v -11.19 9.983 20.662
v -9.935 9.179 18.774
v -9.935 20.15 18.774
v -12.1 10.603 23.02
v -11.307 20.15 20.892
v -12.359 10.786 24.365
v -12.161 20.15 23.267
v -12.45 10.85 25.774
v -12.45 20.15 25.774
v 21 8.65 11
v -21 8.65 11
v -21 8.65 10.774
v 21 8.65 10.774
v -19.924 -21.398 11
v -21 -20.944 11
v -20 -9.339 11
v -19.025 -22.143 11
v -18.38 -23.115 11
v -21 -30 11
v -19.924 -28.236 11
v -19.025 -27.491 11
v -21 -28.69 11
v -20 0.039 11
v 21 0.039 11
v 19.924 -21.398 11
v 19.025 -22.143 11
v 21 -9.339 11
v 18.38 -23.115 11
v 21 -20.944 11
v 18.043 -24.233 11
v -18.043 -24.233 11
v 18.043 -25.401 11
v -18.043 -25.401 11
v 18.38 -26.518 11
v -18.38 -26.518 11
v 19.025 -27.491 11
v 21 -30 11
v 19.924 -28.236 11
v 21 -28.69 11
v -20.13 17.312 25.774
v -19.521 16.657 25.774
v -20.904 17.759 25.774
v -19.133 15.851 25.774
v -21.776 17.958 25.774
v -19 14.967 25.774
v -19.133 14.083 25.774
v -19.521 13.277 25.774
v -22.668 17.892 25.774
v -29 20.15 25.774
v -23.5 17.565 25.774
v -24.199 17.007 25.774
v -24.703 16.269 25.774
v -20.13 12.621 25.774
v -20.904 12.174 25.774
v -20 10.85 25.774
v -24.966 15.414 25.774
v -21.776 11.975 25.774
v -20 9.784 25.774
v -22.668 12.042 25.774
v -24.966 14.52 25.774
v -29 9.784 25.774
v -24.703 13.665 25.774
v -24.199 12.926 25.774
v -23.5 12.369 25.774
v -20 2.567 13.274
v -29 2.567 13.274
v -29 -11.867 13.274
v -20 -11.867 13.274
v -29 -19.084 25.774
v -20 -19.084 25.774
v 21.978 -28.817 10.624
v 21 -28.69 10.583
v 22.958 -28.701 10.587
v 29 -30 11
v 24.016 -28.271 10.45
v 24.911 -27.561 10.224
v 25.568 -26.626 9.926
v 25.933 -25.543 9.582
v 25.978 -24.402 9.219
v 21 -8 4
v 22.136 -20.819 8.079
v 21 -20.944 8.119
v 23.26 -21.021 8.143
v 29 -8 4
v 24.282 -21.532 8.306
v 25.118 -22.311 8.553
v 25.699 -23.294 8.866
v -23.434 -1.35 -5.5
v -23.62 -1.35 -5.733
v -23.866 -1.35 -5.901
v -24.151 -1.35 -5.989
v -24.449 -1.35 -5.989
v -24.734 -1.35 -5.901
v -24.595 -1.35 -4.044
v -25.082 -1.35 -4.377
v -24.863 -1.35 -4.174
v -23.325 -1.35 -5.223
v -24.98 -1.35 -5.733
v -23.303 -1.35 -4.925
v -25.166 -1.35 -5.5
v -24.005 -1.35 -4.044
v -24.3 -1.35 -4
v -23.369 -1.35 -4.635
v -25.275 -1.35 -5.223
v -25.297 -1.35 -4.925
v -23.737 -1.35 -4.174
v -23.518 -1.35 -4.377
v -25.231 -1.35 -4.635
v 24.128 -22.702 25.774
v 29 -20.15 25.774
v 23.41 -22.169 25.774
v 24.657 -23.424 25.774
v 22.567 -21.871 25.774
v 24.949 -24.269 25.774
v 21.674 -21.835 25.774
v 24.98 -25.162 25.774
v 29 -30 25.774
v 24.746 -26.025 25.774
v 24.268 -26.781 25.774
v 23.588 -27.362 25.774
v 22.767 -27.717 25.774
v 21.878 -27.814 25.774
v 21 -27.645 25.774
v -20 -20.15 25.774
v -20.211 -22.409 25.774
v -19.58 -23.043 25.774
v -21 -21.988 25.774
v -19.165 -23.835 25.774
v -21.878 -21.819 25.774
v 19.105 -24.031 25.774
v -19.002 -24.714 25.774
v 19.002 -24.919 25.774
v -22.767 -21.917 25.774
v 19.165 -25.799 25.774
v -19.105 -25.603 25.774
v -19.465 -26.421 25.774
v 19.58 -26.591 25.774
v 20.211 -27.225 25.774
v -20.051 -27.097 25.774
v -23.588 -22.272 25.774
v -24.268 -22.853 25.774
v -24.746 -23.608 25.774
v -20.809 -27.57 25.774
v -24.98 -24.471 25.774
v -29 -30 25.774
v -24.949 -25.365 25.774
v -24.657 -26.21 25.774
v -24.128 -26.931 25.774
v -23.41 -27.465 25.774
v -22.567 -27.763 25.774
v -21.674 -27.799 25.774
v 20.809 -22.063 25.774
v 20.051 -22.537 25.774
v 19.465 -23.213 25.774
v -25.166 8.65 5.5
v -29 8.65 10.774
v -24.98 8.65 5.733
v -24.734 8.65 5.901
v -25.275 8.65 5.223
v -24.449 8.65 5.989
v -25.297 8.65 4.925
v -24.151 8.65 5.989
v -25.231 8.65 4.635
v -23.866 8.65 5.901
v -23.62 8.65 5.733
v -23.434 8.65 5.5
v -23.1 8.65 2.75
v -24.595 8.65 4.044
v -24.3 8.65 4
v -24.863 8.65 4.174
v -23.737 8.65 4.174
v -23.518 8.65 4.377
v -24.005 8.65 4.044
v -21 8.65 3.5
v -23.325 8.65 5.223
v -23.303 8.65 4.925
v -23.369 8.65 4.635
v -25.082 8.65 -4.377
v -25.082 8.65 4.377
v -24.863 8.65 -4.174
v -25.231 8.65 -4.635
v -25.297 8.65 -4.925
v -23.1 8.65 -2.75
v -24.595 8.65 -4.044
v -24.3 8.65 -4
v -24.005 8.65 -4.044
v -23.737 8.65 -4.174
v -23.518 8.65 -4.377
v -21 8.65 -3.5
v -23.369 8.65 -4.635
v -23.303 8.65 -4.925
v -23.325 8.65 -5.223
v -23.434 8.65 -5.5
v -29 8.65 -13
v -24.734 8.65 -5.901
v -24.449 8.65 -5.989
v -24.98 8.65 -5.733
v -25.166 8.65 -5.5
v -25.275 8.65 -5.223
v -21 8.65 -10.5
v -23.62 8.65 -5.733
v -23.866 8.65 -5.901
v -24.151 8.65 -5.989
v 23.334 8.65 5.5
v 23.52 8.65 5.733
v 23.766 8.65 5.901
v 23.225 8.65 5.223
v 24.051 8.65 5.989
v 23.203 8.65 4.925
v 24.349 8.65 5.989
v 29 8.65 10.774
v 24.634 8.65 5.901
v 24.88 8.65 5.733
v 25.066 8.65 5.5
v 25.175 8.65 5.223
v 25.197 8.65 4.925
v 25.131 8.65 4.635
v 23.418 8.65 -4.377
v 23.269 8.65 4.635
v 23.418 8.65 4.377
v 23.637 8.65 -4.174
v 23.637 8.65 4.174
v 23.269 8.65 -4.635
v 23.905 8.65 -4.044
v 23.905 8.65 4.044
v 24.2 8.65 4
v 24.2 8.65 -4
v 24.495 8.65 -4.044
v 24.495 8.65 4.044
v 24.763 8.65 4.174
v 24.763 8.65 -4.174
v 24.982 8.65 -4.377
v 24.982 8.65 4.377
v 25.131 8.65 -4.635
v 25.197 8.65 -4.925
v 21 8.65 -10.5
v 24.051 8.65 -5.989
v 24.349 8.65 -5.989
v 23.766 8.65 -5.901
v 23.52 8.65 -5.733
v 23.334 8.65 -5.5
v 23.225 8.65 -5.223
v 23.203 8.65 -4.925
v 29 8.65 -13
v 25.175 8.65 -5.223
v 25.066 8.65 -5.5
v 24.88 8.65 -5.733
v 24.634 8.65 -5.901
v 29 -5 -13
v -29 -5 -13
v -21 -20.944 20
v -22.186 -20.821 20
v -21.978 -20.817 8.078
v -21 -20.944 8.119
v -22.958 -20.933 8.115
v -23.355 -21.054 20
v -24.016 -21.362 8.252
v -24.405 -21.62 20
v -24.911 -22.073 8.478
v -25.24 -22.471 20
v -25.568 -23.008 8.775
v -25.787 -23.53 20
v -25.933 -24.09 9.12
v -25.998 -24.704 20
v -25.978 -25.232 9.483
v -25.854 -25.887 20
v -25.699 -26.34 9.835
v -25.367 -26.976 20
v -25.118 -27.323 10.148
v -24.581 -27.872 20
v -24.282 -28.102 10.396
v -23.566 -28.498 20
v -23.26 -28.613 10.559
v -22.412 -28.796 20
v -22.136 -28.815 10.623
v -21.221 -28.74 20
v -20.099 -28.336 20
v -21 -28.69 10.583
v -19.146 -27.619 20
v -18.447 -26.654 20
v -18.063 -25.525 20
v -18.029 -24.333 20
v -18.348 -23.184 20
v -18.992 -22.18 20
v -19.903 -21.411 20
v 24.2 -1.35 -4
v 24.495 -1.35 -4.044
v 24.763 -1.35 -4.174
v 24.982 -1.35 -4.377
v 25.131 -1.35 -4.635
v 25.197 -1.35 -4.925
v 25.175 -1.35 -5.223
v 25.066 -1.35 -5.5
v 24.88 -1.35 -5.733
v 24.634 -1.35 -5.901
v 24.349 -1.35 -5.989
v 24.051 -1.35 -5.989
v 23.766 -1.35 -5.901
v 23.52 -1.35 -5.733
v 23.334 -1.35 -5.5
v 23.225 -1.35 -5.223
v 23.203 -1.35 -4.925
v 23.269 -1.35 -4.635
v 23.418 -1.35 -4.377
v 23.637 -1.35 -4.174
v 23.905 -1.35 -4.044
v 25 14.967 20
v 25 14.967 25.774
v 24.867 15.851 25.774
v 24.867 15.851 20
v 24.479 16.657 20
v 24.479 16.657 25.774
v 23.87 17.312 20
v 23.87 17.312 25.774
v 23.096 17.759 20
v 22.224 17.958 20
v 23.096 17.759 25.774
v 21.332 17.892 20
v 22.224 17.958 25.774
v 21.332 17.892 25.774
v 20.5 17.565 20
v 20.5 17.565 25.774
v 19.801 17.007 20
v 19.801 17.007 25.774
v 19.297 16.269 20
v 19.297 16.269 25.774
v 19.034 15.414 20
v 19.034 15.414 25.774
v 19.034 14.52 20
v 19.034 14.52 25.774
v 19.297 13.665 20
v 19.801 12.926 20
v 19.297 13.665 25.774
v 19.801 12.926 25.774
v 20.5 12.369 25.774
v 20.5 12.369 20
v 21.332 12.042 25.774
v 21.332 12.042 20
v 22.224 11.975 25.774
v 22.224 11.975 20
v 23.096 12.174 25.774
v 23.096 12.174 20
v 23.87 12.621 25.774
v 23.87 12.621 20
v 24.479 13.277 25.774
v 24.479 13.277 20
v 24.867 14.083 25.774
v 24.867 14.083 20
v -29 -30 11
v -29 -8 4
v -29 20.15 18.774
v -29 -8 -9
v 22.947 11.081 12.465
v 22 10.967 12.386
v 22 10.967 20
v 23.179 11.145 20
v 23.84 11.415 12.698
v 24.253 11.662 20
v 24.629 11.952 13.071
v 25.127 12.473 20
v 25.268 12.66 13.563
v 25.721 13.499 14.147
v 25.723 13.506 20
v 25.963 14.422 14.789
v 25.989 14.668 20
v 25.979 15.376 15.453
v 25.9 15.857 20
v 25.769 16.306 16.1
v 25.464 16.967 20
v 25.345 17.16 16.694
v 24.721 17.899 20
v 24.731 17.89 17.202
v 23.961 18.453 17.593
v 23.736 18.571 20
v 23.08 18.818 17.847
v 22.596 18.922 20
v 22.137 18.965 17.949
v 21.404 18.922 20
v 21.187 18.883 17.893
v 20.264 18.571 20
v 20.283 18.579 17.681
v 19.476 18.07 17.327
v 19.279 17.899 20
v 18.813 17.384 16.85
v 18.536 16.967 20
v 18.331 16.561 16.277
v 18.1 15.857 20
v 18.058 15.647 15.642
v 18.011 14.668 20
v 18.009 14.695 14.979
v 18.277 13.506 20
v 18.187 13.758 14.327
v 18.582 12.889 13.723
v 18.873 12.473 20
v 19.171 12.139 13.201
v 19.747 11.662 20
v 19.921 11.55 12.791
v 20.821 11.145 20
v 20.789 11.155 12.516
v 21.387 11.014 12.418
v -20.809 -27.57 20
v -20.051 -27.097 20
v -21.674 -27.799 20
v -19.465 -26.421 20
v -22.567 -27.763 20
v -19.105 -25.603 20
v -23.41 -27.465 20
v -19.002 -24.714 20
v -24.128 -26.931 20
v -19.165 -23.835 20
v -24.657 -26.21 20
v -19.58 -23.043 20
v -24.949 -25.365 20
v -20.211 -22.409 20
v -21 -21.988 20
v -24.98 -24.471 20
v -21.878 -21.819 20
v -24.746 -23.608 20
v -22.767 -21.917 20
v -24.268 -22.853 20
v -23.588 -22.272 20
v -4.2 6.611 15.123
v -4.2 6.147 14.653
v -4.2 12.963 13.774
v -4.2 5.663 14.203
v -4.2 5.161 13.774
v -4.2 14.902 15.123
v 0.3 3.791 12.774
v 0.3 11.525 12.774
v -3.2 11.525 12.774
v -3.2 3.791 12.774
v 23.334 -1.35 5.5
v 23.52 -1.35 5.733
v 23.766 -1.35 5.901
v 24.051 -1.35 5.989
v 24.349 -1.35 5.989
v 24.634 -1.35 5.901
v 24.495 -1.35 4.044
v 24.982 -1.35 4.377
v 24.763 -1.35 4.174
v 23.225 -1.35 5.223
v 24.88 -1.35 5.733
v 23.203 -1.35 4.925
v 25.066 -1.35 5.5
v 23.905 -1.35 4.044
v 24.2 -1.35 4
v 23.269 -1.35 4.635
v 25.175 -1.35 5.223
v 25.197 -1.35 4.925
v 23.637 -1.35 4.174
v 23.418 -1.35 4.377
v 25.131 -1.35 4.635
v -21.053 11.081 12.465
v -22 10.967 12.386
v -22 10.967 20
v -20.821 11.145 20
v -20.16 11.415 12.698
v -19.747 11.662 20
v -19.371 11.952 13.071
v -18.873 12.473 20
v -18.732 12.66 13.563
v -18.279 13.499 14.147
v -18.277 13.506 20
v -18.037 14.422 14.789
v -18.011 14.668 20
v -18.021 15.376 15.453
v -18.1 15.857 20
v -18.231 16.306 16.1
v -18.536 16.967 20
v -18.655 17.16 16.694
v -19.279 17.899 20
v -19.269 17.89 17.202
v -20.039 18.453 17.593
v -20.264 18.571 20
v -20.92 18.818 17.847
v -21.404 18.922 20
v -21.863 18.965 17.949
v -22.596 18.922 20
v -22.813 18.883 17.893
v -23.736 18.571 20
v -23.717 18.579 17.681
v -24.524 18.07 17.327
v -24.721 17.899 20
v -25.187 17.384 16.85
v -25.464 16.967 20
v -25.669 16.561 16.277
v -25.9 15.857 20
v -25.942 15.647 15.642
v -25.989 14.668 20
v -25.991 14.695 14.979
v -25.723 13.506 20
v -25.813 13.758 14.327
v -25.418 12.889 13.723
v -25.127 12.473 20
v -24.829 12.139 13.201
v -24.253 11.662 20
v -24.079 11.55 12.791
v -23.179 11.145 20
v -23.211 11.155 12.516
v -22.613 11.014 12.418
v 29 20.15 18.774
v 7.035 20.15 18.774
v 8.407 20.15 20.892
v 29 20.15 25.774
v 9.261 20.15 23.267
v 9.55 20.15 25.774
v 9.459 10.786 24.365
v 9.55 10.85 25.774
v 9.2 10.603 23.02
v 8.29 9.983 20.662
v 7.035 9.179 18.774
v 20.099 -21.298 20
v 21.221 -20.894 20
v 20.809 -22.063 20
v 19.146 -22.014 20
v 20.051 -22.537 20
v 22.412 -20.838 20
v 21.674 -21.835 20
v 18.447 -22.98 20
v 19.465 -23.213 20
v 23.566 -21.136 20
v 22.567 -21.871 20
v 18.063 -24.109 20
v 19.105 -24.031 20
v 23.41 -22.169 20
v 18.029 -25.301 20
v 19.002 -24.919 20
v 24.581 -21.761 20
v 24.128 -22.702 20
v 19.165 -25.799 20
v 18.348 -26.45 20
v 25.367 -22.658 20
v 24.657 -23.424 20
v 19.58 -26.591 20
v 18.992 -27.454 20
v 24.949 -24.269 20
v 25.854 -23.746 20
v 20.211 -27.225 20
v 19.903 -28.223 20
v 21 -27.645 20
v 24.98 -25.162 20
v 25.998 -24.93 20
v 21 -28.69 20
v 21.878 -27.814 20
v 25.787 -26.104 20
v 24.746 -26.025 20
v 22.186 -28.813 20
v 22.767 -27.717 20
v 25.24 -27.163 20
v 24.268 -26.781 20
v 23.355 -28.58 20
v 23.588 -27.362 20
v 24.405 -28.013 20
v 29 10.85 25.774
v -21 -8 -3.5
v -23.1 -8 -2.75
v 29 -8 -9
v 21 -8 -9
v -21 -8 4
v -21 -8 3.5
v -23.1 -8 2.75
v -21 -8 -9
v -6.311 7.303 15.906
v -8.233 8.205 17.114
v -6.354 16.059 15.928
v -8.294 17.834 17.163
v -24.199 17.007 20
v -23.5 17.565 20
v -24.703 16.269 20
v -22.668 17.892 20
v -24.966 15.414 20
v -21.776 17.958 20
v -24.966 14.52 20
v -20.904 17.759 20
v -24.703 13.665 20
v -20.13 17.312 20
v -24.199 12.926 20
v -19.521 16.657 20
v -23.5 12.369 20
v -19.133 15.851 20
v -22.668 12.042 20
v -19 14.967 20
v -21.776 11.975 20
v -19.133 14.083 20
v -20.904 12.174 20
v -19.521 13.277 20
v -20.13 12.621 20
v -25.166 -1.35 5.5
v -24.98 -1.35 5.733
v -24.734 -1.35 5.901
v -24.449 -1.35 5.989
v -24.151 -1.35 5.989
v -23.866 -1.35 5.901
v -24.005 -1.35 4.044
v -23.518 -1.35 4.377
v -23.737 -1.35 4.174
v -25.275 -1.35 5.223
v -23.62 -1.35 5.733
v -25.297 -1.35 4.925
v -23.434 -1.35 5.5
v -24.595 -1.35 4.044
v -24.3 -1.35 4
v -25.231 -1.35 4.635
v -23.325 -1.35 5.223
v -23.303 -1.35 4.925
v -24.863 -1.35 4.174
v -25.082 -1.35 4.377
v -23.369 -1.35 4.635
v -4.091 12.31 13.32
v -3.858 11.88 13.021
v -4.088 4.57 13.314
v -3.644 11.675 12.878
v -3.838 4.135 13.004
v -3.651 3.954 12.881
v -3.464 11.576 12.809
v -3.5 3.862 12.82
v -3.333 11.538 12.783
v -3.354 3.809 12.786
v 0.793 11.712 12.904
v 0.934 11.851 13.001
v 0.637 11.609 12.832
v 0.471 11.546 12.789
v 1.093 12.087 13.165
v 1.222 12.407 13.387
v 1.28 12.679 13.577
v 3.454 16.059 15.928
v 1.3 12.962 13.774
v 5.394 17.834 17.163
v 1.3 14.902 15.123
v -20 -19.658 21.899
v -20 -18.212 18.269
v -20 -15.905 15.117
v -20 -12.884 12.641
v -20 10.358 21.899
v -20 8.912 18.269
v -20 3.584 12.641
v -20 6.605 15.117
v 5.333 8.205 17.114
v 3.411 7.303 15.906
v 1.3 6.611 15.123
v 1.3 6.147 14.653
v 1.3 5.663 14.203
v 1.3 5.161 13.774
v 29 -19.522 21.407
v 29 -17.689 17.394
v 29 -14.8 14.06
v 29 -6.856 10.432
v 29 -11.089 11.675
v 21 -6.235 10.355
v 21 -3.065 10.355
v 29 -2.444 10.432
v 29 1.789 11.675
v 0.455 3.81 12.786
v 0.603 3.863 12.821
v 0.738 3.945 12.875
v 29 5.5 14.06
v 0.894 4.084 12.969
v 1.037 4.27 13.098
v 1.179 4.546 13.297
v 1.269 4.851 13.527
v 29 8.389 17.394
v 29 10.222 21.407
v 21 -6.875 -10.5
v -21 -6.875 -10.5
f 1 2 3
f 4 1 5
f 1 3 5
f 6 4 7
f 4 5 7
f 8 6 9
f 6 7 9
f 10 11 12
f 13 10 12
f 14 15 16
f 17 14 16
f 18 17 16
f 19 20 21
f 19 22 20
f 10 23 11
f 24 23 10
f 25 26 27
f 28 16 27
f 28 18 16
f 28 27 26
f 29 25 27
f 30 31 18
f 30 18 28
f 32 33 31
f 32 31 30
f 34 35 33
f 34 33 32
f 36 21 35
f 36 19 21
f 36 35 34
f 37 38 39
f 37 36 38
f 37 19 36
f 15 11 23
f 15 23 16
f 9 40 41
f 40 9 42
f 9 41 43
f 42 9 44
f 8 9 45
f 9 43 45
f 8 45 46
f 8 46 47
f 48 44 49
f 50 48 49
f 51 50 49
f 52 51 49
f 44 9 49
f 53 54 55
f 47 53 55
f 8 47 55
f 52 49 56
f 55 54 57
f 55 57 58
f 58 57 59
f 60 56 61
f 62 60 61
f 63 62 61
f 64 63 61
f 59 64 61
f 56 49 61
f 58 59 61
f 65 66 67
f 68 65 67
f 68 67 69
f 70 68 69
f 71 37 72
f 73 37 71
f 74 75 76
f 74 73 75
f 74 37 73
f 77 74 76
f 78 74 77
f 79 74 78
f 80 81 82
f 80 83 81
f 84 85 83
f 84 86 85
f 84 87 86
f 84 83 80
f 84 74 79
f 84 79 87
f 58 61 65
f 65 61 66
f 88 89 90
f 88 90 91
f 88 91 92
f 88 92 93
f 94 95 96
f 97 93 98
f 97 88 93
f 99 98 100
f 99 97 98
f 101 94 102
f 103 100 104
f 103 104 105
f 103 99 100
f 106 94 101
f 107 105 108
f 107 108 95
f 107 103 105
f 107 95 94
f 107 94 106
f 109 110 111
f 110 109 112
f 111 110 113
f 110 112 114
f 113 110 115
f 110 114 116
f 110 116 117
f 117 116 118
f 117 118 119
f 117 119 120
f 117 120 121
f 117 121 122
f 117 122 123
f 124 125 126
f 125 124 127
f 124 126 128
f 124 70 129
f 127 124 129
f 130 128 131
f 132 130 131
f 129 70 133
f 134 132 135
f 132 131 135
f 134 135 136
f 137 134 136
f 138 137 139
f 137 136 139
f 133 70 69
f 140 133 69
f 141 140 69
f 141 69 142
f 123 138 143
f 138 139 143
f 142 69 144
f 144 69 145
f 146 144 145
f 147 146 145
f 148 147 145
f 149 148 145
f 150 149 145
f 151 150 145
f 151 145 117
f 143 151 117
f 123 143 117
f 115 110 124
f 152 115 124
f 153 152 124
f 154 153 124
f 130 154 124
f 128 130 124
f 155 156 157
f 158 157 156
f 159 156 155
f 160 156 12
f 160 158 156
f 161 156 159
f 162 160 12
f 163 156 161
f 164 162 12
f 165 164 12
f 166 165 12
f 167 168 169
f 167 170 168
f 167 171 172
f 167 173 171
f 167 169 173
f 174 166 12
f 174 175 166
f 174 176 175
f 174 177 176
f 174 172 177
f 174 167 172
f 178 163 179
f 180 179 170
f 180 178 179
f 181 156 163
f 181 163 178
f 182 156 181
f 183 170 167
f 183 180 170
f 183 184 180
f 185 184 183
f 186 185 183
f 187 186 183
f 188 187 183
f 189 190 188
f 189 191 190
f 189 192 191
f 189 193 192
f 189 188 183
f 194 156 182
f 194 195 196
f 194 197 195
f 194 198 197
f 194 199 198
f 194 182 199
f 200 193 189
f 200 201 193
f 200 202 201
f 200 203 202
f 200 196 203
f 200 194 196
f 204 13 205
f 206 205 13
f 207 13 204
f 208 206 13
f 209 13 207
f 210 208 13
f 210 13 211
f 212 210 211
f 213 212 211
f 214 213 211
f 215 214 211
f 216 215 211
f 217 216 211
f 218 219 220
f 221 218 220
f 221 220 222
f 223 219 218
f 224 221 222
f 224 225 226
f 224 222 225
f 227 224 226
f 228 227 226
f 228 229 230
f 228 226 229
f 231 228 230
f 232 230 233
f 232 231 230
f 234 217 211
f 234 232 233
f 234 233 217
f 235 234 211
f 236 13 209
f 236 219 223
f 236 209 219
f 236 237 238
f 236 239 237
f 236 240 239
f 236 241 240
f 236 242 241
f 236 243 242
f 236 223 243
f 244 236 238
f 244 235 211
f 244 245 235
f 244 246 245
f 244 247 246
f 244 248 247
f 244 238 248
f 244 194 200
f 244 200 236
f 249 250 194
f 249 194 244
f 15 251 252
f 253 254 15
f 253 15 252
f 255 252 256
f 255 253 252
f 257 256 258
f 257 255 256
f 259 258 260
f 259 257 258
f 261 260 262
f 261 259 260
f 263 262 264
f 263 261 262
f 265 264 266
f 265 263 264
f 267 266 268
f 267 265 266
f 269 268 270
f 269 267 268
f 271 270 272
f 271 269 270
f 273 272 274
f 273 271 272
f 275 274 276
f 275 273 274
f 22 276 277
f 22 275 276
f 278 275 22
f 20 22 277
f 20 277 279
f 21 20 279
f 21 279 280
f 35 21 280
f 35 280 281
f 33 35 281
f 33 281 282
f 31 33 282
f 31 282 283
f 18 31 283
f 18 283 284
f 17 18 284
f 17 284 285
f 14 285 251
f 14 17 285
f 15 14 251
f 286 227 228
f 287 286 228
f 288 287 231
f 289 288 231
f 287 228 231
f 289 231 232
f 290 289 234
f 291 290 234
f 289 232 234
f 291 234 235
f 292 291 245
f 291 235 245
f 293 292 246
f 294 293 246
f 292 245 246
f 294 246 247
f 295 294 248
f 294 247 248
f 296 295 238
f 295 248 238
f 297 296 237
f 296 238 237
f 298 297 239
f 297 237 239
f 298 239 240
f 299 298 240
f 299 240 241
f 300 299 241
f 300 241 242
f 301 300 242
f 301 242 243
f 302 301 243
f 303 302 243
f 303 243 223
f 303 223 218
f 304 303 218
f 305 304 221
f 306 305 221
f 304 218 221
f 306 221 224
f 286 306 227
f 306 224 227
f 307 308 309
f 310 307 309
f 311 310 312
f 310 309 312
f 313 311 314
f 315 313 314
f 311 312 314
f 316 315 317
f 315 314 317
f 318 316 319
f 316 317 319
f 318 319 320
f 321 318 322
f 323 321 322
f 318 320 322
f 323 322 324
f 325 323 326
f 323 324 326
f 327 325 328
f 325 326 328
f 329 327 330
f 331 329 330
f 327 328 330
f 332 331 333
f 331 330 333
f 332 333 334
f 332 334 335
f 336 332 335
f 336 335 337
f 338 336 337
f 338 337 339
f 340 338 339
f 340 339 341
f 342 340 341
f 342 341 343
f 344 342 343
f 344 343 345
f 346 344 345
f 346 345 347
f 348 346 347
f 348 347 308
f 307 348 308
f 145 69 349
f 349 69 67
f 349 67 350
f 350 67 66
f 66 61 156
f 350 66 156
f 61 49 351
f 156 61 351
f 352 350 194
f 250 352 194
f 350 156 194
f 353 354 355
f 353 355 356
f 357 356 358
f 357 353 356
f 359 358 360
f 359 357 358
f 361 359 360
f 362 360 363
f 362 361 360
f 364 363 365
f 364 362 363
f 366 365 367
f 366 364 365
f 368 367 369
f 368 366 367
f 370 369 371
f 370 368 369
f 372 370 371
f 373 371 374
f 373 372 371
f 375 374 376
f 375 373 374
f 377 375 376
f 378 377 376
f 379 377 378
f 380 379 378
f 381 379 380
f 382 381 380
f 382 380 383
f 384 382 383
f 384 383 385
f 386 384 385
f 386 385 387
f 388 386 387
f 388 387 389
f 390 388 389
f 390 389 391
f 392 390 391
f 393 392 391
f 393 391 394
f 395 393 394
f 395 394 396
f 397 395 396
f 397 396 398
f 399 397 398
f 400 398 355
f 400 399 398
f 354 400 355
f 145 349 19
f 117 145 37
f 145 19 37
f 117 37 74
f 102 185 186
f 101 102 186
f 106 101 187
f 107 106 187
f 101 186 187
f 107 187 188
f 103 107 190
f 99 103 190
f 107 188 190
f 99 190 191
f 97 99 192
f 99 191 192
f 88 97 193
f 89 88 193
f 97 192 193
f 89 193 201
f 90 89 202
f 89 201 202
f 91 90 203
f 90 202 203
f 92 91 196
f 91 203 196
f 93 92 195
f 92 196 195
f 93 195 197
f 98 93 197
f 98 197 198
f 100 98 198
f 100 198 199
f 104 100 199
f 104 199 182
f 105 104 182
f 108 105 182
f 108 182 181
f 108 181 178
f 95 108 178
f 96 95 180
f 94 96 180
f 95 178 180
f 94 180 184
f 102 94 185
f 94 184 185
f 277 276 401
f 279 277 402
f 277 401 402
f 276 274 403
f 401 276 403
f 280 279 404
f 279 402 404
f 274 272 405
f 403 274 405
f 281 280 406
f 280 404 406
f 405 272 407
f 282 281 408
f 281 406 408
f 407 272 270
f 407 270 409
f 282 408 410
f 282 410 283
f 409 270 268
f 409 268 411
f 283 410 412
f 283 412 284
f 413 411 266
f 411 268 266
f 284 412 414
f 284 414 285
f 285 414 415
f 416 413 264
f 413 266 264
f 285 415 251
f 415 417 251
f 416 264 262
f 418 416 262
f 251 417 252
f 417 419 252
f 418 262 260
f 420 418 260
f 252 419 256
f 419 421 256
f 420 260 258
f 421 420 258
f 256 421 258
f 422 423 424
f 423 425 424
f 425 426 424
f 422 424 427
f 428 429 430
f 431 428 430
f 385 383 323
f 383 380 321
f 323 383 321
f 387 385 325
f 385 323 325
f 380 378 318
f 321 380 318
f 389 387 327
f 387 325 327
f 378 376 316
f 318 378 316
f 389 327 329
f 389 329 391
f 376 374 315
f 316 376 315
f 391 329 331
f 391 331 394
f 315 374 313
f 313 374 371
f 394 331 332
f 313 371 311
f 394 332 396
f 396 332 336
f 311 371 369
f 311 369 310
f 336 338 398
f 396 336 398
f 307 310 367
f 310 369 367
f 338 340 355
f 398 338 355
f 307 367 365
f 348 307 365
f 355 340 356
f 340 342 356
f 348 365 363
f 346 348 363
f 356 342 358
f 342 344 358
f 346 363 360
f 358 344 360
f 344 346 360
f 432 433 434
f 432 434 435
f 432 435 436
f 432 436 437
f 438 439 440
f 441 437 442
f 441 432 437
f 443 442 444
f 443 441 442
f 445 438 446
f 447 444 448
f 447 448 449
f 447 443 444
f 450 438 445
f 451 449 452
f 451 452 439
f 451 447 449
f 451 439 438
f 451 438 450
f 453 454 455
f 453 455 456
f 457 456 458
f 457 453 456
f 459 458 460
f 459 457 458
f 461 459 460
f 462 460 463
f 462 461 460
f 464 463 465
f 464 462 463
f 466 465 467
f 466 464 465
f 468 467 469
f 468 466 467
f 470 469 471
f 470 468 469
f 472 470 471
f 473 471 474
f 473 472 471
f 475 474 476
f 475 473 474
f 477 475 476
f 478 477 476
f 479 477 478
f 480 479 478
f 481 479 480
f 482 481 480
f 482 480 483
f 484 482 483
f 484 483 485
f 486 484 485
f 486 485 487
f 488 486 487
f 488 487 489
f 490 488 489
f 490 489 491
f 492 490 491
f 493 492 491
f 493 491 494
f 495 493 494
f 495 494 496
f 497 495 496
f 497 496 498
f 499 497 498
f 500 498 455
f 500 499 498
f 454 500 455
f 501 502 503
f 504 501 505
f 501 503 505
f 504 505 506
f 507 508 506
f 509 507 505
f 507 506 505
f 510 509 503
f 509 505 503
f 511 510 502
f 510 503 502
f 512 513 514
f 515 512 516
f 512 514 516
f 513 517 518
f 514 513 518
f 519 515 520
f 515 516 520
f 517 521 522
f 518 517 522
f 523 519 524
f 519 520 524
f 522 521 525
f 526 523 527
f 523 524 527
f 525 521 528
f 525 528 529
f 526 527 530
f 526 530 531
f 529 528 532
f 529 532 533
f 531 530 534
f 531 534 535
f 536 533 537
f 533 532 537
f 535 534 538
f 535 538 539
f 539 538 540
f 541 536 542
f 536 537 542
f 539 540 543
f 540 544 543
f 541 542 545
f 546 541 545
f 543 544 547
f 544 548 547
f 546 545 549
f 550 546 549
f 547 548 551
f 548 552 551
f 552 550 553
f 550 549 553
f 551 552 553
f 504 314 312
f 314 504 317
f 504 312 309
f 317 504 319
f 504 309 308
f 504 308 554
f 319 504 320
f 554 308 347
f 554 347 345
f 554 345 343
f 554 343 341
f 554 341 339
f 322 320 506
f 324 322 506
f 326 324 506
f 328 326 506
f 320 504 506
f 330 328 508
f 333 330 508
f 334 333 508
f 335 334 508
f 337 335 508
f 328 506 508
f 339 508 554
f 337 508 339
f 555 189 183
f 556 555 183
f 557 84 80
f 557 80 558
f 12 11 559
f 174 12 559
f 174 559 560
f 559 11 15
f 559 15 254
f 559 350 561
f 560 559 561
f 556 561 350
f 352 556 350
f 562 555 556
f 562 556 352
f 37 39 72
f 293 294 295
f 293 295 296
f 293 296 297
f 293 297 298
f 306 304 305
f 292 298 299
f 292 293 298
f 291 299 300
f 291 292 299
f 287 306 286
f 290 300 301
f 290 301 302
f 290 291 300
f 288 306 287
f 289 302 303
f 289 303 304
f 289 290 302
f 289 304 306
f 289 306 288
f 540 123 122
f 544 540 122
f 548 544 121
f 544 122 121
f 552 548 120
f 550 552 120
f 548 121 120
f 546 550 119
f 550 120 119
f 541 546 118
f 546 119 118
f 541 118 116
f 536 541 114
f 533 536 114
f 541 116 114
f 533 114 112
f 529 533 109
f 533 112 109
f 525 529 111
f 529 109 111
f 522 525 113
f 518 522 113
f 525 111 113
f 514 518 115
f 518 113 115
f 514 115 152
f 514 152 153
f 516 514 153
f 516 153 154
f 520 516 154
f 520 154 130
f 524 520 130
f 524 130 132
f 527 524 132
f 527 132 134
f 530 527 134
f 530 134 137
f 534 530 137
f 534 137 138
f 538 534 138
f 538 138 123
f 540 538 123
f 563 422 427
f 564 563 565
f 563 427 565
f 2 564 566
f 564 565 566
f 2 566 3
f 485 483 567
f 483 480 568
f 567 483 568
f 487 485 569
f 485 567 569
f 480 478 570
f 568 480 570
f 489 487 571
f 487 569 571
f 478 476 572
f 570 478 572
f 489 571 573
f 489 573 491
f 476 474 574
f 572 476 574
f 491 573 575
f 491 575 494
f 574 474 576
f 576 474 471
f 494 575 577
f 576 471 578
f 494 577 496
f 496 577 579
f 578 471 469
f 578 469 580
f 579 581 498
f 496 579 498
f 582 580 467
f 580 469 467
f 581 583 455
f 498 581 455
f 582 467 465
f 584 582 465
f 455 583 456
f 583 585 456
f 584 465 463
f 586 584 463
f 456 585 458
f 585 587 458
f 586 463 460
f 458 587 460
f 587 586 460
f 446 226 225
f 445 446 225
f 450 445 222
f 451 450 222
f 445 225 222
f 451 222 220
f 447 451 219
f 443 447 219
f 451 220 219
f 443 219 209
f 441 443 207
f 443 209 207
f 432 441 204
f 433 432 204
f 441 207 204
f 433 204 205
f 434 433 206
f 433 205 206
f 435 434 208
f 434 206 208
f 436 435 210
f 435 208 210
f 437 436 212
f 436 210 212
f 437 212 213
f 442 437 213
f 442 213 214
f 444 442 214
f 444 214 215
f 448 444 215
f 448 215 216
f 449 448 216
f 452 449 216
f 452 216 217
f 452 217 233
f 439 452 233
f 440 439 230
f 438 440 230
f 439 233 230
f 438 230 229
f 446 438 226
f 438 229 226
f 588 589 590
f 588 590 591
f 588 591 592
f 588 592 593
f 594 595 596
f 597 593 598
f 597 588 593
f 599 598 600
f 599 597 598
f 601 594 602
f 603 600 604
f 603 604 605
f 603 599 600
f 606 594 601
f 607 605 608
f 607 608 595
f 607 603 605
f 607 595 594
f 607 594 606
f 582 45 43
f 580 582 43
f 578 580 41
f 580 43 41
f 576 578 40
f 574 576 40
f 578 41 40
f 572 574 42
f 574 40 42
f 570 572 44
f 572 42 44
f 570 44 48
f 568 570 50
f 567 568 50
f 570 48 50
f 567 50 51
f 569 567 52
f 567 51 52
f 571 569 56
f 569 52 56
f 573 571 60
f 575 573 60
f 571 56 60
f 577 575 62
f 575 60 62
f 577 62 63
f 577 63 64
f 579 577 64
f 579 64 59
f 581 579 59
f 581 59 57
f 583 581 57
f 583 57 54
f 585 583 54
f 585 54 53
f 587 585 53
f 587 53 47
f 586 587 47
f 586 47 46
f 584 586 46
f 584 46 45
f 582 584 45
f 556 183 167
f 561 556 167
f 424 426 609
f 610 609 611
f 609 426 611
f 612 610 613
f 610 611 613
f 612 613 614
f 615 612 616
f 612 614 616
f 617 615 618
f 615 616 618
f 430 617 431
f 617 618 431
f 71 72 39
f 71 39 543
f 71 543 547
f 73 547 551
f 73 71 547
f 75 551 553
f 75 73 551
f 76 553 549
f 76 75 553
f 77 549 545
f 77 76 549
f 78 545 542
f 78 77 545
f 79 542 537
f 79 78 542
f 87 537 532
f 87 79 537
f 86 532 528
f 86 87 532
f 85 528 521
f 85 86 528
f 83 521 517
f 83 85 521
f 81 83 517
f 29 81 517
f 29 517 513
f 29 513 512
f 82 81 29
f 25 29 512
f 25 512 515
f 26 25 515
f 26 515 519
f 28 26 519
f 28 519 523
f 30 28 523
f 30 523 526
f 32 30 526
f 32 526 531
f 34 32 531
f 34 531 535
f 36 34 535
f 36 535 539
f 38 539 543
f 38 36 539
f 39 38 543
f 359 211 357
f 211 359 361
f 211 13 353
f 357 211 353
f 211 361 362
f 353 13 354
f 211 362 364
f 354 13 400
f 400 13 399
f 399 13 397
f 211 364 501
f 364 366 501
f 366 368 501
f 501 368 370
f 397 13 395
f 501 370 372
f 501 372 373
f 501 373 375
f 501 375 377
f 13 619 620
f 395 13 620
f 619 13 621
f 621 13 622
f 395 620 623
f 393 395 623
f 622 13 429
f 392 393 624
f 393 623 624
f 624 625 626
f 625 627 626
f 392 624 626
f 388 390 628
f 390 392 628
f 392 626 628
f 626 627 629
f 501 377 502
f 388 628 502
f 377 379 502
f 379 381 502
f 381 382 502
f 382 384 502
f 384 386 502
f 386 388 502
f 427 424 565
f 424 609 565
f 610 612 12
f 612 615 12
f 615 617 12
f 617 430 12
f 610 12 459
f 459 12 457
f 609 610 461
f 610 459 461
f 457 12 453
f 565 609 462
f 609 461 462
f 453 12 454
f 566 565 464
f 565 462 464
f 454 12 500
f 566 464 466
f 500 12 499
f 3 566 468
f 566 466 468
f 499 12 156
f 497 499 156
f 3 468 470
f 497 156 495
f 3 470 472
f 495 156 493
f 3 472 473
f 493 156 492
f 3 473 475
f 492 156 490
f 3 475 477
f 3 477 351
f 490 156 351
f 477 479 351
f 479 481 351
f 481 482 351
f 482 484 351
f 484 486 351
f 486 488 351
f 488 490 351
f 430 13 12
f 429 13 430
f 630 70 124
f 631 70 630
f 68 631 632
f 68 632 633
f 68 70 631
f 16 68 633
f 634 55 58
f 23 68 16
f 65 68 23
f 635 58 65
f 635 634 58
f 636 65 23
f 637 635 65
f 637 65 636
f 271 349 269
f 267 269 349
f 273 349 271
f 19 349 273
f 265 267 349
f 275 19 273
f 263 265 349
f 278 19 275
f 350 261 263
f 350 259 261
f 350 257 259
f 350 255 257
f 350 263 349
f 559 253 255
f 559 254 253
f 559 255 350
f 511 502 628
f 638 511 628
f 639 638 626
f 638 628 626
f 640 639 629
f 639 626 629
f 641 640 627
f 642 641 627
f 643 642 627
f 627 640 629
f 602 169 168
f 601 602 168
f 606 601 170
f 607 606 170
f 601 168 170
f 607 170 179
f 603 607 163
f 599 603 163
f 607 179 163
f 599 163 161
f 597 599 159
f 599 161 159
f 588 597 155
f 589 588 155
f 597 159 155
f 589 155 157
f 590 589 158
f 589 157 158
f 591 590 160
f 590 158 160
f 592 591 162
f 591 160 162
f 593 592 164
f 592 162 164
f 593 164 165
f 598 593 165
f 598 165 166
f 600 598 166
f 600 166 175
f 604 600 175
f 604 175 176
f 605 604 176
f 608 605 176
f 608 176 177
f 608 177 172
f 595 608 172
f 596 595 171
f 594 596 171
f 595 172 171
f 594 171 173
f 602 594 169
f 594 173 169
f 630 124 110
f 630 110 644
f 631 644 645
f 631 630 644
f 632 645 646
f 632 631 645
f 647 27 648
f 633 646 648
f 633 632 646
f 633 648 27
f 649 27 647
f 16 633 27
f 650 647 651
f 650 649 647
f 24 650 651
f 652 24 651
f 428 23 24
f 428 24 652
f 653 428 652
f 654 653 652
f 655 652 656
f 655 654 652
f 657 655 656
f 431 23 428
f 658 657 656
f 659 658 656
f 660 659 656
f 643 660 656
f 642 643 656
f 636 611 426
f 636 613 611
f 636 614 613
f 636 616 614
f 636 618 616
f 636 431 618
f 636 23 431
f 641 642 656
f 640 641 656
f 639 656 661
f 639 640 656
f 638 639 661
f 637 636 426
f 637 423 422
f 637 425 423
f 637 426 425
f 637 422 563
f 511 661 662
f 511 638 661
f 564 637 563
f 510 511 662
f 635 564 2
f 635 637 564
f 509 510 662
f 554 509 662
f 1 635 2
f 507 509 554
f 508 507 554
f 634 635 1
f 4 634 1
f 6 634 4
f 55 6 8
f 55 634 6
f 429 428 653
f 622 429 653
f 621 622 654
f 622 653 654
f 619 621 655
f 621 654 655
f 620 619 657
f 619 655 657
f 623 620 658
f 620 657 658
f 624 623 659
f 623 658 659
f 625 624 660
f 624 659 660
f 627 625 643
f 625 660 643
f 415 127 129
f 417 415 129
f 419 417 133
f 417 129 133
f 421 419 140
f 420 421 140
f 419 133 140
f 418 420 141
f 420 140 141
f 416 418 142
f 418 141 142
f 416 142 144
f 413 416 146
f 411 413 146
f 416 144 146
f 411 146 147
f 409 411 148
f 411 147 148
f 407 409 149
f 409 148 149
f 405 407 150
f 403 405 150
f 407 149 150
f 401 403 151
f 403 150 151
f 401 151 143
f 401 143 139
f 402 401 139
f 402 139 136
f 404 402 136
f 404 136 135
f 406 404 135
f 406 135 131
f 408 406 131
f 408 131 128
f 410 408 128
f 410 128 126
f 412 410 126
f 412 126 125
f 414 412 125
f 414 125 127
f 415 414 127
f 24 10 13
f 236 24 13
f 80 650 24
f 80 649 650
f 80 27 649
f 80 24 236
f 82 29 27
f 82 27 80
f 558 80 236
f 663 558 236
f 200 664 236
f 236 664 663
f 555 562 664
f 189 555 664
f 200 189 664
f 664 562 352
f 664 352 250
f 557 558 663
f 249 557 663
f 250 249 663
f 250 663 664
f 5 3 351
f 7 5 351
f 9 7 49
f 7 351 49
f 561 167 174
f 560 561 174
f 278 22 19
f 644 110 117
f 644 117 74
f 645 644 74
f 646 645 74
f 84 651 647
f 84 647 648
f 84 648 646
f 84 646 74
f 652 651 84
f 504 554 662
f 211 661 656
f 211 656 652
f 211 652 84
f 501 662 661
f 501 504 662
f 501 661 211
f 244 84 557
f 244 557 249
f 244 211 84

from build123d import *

# Parameters (mm, degrees)
SKETCH1_W               = 58
SKETCH1_H               = 38.77382393
SKETCH1_W_2             = 42
SKETCH1_H_2             = 21.5
BOSS_EXTRUDE2_DEPTH     = 38.65
CUT_EXTRUDE3_DEPTH      = 71.201780604
BOSS_EXTRUDE3_REACH     = 72.202
CUT_EXTRUDE5_DEPTH      = 71.201780604
SKETCH10_W              = 5.5
SKETCH10_H              = 7
CUT_EXTRUDE6_DEPTH      = 17
FILLET1_R               = 1
CUT_EXTRUDE7_DEPTH      = 50.043755974
CUT_EXTRUDE7_DEPTH_BACK = 20
SKETCH11_R              = 15.5
SKETCH12_R              = 3
CUT_EXTRUDE8_DEPTH      = 20
SKETCH13_R              = 4
CUT_EXTRUDE9_DEPTH      = 20
SKETCH15_R              = 1
CUT_EXTRUDE10_DEPTH     = 10
CUT_EXTRUDE11_DEPTH     = 55.764153522


with BuildPart() as part:
    # Sketch1 → Boss-Extrude2 (new body)
    with BuildSketch(Plane(origin=(0, -30, 0), x_dir=(1, 0, 0), z_dir=(0, 1, 0))):
        with Locations((0, -6.386911965)):
            Rectangle(SKETCH1_W, SKETCH1_H)
        with Locations((0, -0.25)):
            Rectangle(SKETCH1_W_2, SKETCH1_H_2, mode=Mode.SUBTRACT)
    extrude(amount=BOSS_EXTRUDE2_DEPTH)

    # Sketch6 → Cut-Extrude3 (cut, through all)
    with BuildSketch(Plane(origin=(29, 0, 0), x_dir=(0, 0, -1), z_dir=(1, 0, 0))):
        Polygon((-11, -30), (-4, -8), (9, -8), (13, -5), (13, -30), align=None)
    extrude(amount=-CUT_EXTRUDE3_DEPTH, mode=Mode.SUBTRACT)

    # Boss-Extrude3: up to this face of the body (flat: up to its plane)
    boss_extrude3_end = Plane(part.part.faces().sort_by_distance((29, -6.820520007, 10.403923083))[0])
    # Sketch9 → Boss-Extrude3 (add, up to the picked face)
    with BuildSketch(Plane.ZY.offset(29), mode=Mode.PRIVATE) as boss_extrude3_sk1:
        Polygon((10.77382393, 8.65), (18.77382393, 20.15), (25.77382393, 20.15), (25.77382393, 8.65), align=None)
    boss_extrude3_tool1 = split(extrude(boss_extrude3_sk1.sketch, amount=-BOSS_EXTRUDE3_REACH, mode=Mode.PRIVATE), bisect_by=boss_extrude3_end, keep=Keep.BOTH, mode=Mode.PRIVATE)
    add(boss_extrude3_tool1.solids().sort_by(Axis((-29, 13.70303, 20.0314), (1, 0, 0)))[0])

    # Sketch8 → Cut-Extrude5 (cut, through all)
    with BuildSketch(Plane.ZY.offset(29)):
        Polygon((25.77382393, 9.78375673), (13.27382393, 2.566878365), (13.27382393, -11.866878365), (25.77382393, -19.08375673), (38.27382393, -11.866878365), (38.27382393, 2.566878365), align=None)
    extrude(amount=-CUT_EXTRUDE5_DEPTH, mode=Mode.SUBTRACT)

    # Sketch10 → Cut-Extrude6 (cut)
    with BuildSketch(Plane(origin=(0, 20.15, 0), x_dir=(1, 0, 0), z_dir=(0, 1, 0))):
        with BuildLine():
            Line((-4.2, -12.77382393), (-4.2, -15.123119728))
            ThreePointArc((-4.2, -15.123119728), (-1.45, -14.77382393), (1.3, -15.123119728))
            Line((1.3, -15.123119728), (1.3, -12.77382393))
            Line((1.3, -12.77382393), (-4.2, -12.77382393))
        make_face()
        with BuildLine():
            Line((1.3, -18.77382393), (1.3, -25.77382393))
            Line((1.3, -25.77382393), (9.55, -25.77382393))
            ThreePointArc((9.55, -25.77382393), (8.90224843, -22.054825081), (7.035281374, -18.77382393))
            Line((7.035281374, -18.77382393), (1.3, -18.77382393))
        make_face()
        with BuildLine():
            Line((1.3, -15.123119728), (1.3, -18.77382393))
            Line((1.3, -18.77382393), (7.035281374, -18.77382393))
            ThreePointArc((7.035281374, -18.77382393), (4.456758602, -16.4942656), (1.3, -15.123119728))
        make_face()
        with BuildLine():
            Line((-4.2, -15.123119728), (-4.2, -18.77382393))
            Line((-4.2, -18.77382393), (1.3, -18.77382393))
            Line((1.3, -18.77382393), (1.3, -15.123119728))
            ThreePointArc((1.3, -15.123119728), (-1.45, -14.77382393), (-4.2, -15.123119728))
        make_face()
        with BuildLine():
            Line((-12.45, -25.77382393), (-4.2, -25.77382393))
            Line((-4.2, -25.77382393), (-4.2, -18.77382393))
            Line((-4.2, -18.77382393), (-9.935281374, -18.77382393))
            ThreePointArc((-9.935281374, -18.77382393), (-11.80224843, -22.054825081), (-12.45, -25.77382393))
        make_face()
        with Locations((-1.45, -22.27382393)):
            Rectangle(SKETCH10_W, SKETCH10_H)
        with BuildLine():
            Line((-9.935281374, -18.77382393), (-4.2, -18.77382393))
            Line((-4.2, -18.77382393), (-4.2, -15.123119728))
            ThreePointArc((-4.2, -15.123119728), (-7.356758602, -16.4942656), (-9.935281374, -18.77382393))
        make_face()
    extrude(amount=-CUT_EXTRUDE6_DEPTH, mode=Mode.SUBTRACT)

    # Fillet1
    fillet1_edges = [part.edges().sort_by_distance(p)[0] for p in [
        (1.3, 7.3375, 12.77382393),
        (-4.2, 7.3375, 12.77382393),
    ]]
    fillet(fillet1_edges, radius=FILLET1_R)

    # Sketch11 → Cut-Extrude7 (cut, two sides: drawn at the far end of the back side and taken through both)
    with BuildSketch(Plane(origin=(0, 0, 0), x_dir=(0, 0, -1), z_dir=(1, 0, 0)).offset(-CUT_EXTRUDE7_DEPTH_BACK)):
        with Locations((-25.77382393, -4.65)):
            Circle(SKETCH11_R)
    extrude(amount=CUT_EXTRUDE7_DEPTH + CUT_EXTRUDE7_DEPTH_BACK, mode=Mode.SUBTRACT)

    # Sketch12 → Cut-Extrude8 (cut)
    with BuildSketch(Plane.XY.offset(25.77382393)):
        with Locations((-22, 14.966878365)):
            Circle(SKETCH12_R)
        with Locations((22, 14.966878365)):
            Circle(SKETCH12_R)
        with Locations(Location((22, -24.816878365, 0), (0, 0, 250.528779366))):
            Circle(SKETCH12_R)
        with Locations(Location((-22, -24.816878365, 0), (0, 0, 70.528779366))):
            Circle(SKETCH12_R)
    extrude(amount=-CUT_EXTRUDE8_DEPTH, mode=Mode.SUBTRACT)

    # Sketch13 → Cut-Extrude9 (cut)
    with BuildSketch(Plane.XY):
        with Locations(Location((22, 14.966878365, 0), (0, 0, 270))):
            Circle(SKETCH13_R)
        with Locations(Location((-22, 14.966878365, 0), (0, 0, 270))):
            Circle(SKETCH13_R)
        with Locations(Location((22, -24.816878365, 0), (0, 0, 255.522487814))):
            Circle(SKETCH13_R)
        with Locations(Location((-22, -24.816878365, 0), (0, 0, 75.522487814))):
            Circle(SKETCH13_R)
    extrude(amount=CUT_EXTRUDE9_DEPTH, mode=Mode.SUBTRACT)

    # Sketch15 → Cut-Extrude10 (cut)
    with BuildSketch(Plane(origin=(0, 8.65, 0), x_dir=(1, 0, 0), z_dir=(0, 1, 0))):
        with Locations(Location((-24.3, 5, 0), (0, 0, 270))):
            Circle(SKETCH15_R)
        with Locations(Location((-24.3, -5, 0), (0, 0, 90))):
            Circle(SKETCH15_R)
        with Locations(Location((24.2, 5, 0), (0, 0, 270))):
            Circle(SKETCH15_R)
        with Locations(Location((24.2, -5, 0), (0, 0, 90))):
            Circle(SKETCH15_R)
    extrude(amount=-CUT_EXTRUDE10_DEPTH, mode=Mode.SUBTRACT)

    # Sketch17 → Cut-Extrude11 (cut, through all)
    with BuildSketch(Plane(origin=(0, 8.65, 0), x_dir=(1, 0, 0), z_dir=(0, 1, 0))):
        Polygon((-21, -3.5), (-21, 3.5), (-23.1, 2.75), (-23.1, -2.75), align=None)
    extrude(amount=-CUT_EXTRUDE11_DEPTH, mode=Mode.SUBTRACT)


solid = part.part
